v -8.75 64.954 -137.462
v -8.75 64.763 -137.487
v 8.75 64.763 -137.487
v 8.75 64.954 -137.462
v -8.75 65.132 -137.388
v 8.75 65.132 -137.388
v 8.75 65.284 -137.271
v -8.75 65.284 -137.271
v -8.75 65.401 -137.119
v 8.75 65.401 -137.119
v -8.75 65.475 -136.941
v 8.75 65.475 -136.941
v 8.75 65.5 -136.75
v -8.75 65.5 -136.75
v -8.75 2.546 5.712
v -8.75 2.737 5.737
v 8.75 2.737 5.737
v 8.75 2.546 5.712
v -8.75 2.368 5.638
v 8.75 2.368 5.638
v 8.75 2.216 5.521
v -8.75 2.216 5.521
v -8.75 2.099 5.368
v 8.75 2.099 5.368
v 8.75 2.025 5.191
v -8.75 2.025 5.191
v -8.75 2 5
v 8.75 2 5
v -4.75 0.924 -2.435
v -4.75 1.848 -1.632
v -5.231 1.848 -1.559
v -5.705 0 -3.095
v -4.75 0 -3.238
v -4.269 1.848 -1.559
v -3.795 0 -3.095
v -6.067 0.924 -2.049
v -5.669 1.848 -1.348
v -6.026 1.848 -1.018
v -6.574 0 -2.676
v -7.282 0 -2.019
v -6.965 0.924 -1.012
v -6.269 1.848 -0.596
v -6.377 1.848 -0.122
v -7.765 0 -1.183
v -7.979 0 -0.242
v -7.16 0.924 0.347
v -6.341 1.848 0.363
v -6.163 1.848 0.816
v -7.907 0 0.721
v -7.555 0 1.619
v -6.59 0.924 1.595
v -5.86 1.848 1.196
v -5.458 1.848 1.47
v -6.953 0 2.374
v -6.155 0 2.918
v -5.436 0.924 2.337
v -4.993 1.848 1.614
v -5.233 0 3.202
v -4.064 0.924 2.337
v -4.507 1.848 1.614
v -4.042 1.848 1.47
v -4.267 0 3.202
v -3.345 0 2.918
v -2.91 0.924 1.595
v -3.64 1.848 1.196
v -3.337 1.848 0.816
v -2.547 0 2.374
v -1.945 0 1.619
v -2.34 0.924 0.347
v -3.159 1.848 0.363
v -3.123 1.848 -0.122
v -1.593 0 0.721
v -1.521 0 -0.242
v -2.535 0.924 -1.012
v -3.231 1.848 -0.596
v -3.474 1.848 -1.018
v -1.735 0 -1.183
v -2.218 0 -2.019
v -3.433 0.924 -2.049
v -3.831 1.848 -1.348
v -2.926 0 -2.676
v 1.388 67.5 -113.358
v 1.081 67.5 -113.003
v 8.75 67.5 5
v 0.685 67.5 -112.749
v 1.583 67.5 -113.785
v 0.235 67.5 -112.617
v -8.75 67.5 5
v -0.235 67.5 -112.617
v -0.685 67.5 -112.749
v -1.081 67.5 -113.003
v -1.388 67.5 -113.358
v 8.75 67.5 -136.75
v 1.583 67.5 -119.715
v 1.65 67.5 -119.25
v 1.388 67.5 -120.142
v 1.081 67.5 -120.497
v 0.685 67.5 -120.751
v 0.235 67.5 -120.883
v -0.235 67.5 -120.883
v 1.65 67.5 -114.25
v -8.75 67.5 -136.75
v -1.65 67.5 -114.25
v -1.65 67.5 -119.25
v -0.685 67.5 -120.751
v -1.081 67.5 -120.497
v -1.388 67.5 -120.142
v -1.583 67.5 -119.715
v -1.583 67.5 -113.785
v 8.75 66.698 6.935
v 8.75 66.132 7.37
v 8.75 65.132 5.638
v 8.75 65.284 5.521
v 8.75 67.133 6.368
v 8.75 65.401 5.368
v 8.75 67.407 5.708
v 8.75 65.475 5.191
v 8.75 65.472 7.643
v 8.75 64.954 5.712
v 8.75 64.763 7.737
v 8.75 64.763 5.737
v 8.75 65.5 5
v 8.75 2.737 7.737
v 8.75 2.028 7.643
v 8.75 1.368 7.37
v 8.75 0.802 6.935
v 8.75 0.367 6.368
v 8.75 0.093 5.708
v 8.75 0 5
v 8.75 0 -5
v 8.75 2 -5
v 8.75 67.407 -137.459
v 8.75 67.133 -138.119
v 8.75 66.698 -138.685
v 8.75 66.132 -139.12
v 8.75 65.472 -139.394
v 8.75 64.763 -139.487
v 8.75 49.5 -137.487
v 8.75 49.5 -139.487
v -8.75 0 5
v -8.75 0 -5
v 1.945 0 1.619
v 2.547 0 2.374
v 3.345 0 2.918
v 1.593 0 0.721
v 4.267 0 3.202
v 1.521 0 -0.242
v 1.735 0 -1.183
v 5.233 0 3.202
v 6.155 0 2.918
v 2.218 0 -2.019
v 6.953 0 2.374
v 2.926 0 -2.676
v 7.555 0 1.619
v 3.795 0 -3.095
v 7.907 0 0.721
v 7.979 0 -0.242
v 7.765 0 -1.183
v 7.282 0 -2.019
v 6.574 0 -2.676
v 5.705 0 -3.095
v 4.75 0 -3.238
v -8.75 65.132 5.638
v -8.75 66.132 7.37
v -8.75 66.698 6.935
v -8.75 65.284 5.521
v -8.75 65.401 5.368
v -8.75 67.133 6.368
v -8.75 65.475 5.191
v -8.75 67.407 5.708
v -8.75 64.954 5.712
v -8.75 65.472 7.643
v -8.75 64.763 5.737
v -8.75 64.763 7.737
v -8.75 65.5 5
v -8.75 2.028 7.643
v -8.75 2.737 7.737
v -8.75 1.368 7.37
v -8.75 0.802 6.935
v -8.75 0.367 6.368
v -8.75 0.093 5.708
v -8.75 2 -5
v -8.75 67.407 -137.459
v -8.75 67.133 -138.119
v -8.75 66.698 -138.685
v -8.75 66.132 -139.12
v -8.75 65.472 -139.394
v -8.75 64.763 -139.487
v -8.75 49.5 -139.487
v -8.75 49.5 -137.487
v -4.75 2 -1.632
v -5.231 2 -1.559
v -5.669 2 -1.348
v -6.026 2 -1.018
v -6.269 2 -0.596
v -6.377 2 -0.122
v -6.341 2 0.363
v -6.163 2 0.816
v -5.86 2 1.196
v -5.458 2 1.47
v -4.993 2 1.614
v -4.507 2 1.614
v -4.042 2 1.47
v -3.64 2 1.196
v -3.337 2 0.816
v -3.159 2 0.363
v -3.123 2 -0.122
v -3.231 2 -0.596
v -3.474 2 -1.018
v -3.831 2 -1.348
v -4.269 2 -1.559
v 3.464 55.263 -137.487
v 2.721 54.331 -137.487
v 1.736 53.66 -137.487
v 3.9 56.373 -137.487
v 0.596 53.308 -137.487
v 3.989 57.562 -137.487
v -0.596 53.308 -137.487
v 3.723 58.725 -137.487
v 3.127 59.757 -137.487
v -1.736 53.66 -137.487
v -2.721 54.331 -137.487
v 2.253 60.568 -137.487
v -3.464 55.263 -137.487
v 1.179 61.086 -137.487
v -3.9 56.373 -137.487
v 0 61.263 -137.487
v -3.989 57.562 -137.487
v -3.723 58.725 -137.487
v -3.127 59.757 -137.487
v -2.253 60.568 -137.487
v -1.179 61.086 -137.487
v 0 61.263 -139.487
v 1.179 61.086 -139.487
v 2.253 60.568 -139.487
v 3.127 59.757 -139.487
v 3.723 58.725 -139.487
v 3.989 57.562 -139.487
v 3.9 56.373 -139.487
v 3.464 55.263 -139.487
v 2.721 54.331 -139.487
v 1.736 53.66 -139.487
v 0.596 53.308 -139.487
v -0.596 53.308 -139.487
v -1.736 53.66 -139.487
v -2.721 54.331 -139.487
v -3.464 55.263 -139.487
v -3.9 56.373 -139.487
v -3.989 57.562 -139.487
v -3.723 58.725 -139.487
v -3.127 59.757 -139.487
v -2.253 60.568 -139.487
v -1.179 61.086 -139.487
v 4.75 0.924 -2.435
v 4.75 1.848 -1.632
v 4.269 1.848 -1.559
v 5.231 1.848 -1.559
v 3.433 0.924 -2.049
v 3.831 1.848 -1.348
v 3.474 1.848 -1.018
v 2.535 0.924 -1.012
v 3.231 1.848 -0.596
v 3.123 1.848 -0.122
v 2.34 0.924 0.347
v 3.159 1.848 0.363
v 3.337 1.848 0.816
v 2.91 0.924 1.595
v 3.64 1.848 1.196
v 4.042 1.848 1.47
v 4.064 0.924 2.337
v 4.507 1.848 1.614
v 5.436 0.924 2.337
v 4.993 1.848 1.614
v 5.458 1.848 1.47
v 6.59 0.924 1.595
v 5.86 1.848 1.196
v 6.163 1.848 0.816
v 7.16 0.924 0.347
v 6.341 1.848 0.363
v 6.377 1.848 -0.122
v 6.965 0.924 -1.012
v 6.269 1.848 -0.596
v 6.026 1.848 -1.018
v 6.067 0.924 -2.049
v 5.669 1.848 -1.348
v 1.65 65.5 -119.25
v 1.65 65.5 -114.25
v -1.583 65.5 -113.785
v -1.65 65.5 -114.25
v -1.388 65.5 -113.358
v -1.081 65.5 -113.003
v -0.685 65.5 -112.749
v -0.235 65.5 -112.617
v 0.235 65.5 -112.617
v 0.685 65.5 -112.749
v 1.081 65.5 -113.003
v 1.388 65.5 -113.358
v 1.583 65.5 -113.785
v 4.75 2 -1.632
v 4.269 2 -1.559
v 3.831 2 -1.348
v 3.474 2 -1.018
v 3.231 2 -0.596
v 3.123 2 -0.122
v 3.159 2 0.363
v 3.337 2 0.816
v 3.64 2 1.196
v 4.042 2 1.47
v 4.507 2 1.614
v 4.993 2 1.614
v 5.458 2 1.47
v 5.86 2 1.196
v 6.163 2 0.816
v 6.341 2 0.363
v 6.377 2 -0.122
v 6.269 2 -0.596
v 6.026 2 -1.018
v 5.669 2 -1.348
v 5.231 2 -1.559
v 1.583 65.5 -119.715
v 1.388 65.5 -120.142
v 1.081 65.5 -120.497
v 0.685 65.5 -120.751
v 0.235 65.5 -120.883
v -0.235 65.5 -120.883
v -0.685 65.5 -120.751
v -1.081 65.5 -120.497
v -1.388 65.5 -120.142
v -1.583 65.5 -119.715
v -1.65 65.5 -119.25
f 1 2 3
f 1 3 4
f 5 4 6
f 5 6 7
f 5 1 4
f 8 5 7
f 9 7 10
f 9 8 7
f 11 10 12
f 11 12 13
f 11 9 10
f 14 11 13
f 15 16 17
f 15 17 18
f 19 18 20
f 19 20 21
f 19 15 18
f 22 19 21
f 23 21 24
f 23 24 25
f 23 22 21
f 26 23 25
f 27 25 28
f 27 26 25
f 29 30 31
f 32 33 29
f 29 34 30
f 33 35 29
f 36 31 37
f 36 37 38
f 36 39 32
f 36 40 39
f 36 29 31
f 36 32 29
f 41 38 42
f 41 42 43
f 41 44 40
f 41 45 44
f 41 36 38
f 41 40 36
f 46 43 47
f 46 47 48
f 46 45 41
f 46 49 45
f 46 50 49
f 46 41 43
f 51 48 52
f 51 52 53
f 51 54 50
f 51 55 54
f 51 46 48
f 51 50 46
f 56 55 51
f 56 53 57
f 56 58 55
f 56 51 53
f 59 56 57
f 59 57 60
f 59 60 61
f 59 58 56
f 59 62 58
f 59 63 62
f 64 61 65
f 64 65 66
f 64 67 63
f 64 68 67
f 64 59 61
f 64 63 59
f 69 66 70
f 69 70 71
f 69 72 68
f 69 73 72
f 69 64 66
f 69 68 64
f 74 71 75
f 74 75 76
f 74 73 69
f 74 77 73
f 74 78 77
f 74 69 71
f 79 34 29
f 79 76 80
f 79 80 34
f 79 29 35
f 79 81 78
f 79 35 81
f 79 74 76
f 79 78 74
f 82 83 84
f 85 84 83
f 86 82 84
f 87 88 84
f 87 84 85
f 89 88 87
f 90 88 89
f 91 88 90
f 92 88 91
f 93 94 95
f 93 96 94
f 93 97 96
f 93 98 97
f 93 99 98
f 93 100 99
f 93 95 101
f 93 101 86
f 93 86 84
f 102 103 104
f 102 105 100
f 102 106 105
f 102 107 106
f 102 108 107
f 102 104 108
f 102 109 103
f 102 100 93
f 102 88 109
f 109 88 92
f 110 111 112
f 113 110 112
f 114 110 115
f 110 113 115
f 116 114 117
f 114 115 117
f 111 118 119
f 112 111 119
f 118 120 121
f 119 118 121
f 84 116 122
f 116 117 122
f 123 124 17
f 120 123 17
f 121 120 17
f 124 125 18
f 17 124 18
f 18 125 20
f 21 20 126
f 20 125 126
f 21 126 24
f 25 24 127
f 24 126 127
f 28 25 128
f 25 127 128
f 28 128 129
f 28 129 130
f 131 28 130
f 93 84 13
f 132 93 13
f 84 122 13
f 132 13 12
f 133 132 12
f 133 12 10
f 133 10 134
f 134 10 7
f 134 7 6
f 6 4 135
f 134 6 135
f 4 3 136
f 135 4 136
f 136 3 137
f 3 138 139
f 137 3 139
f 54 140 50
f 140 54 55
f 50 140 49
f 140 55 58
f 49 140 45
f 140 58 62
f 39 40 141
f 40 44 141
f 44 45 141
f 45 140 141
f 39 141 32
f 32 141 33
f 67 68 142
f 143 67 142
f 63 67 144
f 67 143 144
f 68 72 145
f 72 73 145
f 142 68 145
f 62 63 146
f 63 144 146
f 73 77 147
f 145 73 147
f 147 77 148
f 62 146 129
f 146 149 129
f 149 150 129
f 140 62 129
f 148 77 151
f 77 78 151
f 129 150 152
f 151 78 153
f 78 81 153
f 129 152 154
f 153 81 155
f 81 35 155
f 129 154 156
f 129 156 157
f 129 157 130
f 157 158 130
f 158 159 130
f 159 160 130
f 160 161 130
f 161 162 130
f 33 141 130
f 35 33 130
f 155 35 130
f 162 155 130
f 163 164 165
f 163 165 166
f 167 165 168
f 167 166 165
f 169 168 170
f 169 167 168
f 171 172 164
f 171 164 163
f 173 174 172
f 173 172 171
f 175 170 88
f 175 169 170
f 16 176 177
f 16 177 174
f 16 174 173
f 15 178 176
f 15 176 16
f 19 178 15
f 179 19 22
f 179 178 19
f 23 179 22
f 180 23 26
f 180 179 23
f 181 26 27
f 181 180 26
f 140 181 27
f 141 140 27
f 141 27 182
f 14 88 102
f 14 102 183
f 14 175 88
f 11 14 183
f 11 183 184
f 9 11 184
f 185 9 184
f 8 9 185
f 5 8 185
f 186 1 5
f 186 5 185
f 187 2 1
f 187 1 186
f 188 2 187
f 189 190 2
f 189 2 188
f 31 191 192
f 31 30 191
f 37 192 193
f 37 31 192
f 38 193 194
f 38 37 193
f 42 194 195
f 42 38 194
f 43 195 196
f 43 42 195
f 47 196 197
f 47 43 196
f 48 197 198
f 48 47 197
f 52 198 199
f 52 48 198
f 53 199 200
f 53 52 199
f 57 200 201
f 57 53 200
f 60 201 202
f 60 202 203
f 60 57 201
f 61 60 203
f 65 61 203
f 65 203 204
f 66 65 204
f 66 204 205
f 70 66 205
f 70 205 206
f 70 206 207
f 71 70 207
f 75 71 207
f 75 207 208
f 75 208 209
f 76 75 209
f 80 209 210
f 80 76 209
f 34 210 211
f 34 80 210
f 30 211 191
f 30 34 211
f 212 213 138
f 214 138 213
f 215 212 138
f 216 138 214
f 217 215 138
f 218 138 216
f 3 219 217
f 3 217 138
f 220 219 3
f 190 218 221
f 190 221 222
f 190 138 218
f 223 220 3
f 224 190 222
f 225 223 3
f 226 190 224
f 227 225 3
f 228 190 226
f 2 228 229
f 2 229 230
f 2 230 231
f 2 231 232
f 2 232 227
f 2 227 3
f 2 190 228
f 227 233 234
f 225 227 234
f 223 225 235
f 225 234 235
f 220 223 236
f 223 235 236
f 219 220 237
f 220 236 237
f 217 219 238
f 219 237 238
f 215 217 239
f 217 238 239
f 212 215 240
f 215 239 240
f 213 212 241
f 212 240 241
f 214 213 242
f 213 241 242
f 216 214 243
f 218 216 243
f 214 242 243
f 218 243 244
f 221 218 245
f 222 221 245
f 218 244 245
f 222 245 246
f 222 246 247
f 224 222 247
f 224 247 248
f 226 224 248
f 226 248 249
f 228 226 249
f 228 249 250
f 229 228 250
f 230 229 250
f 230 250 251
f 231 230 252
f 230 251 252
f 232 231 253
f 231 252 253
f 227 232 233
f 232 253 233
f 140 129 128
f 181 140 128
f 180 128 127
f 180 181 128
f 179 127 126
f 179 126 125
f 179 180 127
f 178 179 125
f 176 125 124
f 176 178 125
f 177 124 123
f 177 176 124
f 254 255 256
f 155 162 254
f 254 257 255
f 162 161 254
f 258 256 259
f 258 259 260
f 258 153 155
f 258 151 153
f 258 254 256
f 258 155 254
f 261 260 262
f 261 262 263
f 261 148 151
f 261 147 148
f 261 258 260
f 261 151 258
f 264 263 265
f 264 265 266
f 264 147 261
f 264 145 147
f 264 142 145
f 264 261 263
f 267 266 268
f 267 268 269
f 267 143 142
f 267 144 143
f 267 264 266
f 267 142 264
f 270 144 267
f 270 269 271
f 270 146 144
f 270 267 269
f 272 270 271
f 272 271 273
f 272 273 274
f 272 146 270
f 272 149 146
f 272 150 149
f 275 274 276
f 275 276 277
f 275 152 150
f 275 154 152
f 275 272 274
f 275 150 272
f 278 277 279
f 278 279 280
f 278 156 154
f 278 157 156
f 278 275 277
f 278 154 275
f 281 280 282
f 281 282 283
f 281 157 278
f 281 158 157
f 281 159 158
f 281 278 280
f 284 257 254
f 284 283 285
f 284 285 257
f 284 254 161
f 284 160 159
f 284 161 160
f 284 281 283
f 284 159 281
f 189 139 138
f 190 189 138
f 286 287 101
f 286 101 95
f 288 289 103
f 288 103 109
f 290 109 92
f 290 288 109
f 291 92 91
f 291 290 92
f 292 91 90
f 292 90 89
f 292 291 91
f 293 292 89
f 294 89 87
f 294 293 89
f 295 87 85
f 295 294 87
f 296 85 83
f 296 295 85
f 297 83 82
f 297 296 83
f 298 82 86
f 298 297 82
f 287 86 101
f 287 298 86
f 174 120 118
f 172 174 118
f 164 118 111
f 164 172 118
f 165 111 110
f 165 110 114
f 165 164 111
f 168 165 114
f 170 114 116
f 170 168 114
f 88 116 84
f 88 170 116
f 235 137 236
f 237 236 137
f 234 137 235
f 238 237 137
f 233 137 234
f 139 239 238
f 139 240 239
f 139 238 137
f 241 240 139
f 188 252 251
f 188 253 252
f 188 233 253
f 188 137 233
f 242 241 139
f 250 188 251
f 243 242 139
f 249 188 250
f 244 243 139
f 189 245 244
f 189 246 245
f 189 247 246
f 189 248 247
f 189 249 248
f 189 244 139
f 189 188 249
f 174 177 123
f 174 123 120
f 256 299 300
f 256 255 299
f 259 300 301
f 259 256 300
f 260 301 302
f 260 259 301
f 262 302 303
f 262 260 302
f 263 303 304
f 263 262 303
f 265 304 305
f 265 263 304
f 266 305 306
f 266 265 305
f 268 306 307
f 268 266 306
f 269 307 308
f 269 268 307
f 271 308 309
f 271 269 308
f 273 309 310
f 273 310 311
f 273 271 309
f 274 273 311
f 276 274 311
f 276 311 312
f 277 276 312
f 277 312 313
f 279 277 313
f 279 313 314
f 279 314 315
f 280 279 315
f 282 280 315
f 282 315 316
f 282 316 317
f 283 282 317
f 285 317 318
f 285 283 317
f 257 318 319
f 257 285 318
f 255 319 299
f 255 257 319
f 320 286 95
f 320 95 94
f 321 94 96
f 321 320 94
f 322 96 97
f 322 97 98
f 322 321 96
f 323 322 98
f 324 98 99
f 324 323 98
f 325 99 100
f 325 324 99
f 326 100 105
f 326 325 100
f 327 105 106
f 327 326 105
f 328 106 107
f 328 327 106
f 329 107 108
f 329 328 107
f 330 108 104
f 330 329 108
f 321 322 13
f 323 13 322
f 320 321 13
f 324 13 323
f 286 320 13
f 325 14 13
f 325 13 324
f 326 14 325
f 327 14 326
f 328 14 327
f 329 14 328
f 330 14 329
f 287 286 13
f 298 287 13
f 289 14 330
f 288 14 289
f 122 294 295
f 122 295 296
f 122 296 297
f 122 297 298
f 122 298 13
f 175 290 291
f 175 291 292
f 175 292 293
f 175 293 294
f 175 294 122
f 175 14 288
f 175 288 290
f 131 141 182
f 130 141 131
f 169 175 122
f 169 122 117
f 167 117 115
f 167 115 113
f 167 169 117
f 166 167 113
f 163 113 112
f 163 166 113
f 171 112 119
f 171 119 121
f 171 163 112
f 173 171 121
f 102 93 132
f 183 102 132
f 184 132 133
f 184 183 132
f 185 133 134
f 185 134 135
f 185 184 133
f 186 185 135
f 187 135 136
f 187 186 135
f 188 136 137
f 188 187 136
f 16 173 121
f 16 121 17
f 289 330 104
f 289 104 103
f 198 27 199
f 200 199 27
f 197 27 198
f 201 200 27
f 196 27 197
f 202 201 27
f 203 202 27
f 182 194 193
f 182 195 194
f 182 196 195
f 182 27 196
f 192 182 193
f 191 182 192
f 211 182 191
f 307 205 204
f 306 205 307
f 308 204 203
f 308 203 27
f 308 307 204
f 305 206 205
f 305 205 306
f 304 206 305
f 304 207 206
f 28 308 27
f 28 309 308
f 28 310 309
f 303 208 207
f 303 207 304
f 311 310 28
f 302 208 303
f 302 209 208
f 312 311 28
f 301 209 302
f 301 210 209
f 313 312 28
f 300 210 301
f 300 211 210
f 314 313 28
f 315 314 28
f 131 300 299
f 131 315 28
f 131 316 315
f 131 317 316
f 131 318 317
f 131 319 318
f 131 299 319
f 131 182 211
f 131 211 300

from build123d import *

# Parameters (mm, degrees)
SKETCH1_W                                     = 17.5
SKETCH1_H                                     = 10
BASE_FLANGE1_DEPTH                            = 2
EDGE_FLANGE1_DEPTH                            = 17.5
EDGE_FLANGE2_STRIP_W                          = 9.4732
EDGE_FLANGE2_STRIP_H                          = 2
EDGE_FLANGE2_STRIP_CUT_DEPTH                  = 17.5
EDGE_FLANGE2_DEPTH                            = 17.5
EDGE_FLANGE3_STRIP_W                          = 9.4732
EDGE_FLANGE3_STRIP_H                          = 2
EDGE_FLANGE3_STRIP_CUT_DEPTH                  = 17.5
EDGE_FLANGE3_DEPTH                            = 17.5
SKETCH18_R                                    = 4
CUT_EXTRUDE2_DEPTH                            = 2
CSK_FOR_4_FLAT_HEAD_SOCKET_CAP_SCREW1_A_COUNT = 2
CSK_FOR_4_FLAT_HEAD_SOCKET_CAP_SCREW1_A_PITCH = 9.5
CUT_EXTRUDE3_DEPTH                            = 2


# Sheet-metal steps are written as plain solids
with BuildPart() as part:
    # Sketch1 → Base-Flange1 (new body)
    with BuildSketch(Plane(origin=(0, 0, 0), x_dir=(1, 0, 0), z_dir=(0, 1, 0))):
        Rectangle(SKETCH1_W, SKETCH1_H)
    extrude(amount=BASE_FLANGE1_DEPTH)

    # Edge-Flange1 section (across the edge) → Edge-Flange1 (add)
    with BuildSketch(Plane(origin=(-8.75, 2, 5.7366), x_dir=(0, 0, -1), z_dir=(1, 0, 0))):
        with BuildLine():
            Line((-2, 0.7366), (-2, 65.5))
            Line((-2, 65.5), (0, 65.5))
            Line((0, 65.5), (0, 0.7366))
            ThreePointArc((0, 0.7366), (0.215745145, 0.215745145), (0.7366, 0))
            Line((0.7366, 0), (0.7366, -2))
            ThreePointArc((0.7366, -2), (-1.198468417, -1.198468417), (-2, 0.7366))
        make_face()
    extrude(amount=EDGE_FLANGE1_DEPTH)

    # Edge-Flange2 strip (across the edge) → Edge-Flange2 strip cut (cut)
    with BuildSketch(Plane(origin=(-8.75, 67.5, 5.7366), x_dir=(0, -1, 0), z_dir=(1, 0, 0))):
        with Locations((-2, -1)):
            Rectangle(EDGE_FLANGE2_STRIP_W, EDGE_FLANGE2_STRIP_H)
    extrude(amount=EDGE_FLANGE2_STRIP_CUT_DEPTH, mode=Mode.SUBTRACT)

    # Edge-Flange2 section (across the edge) → Edge-Flange2 (add)
    with BuildSketch(Plane(origin=(-8.75, 67.5, 5.7366), x_dir=(0, -1, 0), z_dir=(1, 0, 0))):
        with BuildLine():
            Line((0, 0.7366), (0, 145.22348749))
            Line((0, 145.22348749), (2, 145.22348749))
            Line((2, 145.22348749), (2, 0.7366))
            ThreePointArc((2, 0.7366), (2.215745145, 0.215745145), (2.7366, 0))
            Line((2.7366, 0), (2.7366, -2))
            ThreePointArc((2.7366, -2), (0.801531583, -1.198468417), (0, 0.7366))
        make_face()
    extrude(amount=EDGE_FLANGE2_DEPTH)

    # Edge-Flange3 strip (across the edge) → Edge-Flange3 strip cut (cut)
    with BuildSketch(Plane(origin=(-8.75, 65.5, -139.48688749), x_dir=(0, 0, 1), z_dir=(1, 0, 0))):
        with Locations((-2, -1)):
            Rectangle(EDGE_FLANGE3_STRIP_W, EDGE_FLANGE3_STRIP_H)
    extrude(amount=EDGE_FLANGE3_STRIP_CUT_DEPTH, mode=Mode.SUBTRACT)

    # Edge-Flange3 section (across the edge) → Edge-Flange3 (add)
    with BuildSketch(Plane(origin=(-8.75, 65.5, -139.48688749), x_dir=(0, 0, 1), z_dir=(1, 0, 0))):
        with BuildLine():
            Line((0, 0.7366), (0, 16))
            Line((0, 16), (2, 16))
            Line((2, 16), (2, 0.7366))
            ThreePointArc((2, 0.7366), (2.215745145, 0.215745145), (2.7366, 0))
            Line((2.7366, 0), (2.7366, -2))
            ThreePointArc((2.7366, -2), (0.801531583, -1.198468417), (0, 0.7366))
        make_face()
    extrude(amount=EDGE_FLANGE3_DEPTH)

    # Sketch18 → Cut-Extrude2 (cut)
    with BuildSketch(Plane(origin=(0, 0, -139.48688749), x_dir=(-1, 0, 0), z_dir=(0, 0, -1))):
        with Locations(Location((0, 57.2634, 0), (0, 0, 90))):
            Circle(SKETCH18_R)
    extrude(amount=-CUT_EXTRUDE2_DEPTH, mode=Mode.SUBTRACT)

    # Sketch20 → CSK for #4 Flat Head Socket Cap Screw1 (revolve, cut)
    with BuildSketch(Plane(origin=(4.75, 0, 0), x_dir=(0, 0, -1), z_dir=(1, 0, 0))):
        Polygon((0, 0), (0, 2.980574487), (1.63195, 2), (1.63195, 1.848124365), (3.2385, 0), align=None)
    csk_for_4_flat_head_socket_cap_screw1 = revolve(axis=Axis((4.75, -6.35, 0), (0, 1, 0)), mode=Mode.SUBTRACT)

    # CSK for #4 Flat Head Socket Cap Screw1 a: CSK for #4 Flat Head Socket Cap Screw1 ×2
    with Locations(*[(-i * CSK_FOR_4_FLAT_HEAD_SOCKET_CAP_SCREW1_A_PITCH, 0, 0) for i in range(1, CSK_FOR_4_FLAT_HEAD_SOCKET_CAP_SCREW1_A_COUNT)]):
        add(csk_for_4_flat_head_socket_cap_screw1, mode=Mode.SUBTRACT)

    # Sketch23 → Cut-Extrude3 (cut)
    with BuildSketch(Plane.XZ.offset(-65.5)):
        with BuildLine():
            Line((-1.65, -119.25028749), (-1.65, -114.25028749))
            ThreePointArc((-1.65, -114.25028749), (0, -112.60028749), (1.65, -114.25028749))
            Line((1.65, -114.25028749), (1.65, -119.25028749))
            ThreePointArc((1.65, -119.25028749), (0, -120.90028749), (-1.65, -119.25028749))
        make_face()
    extrude(amount=-CUT_EXTRUDE3_DEPTH, mode=Mode.SUBTRACT)


solid = part.part
